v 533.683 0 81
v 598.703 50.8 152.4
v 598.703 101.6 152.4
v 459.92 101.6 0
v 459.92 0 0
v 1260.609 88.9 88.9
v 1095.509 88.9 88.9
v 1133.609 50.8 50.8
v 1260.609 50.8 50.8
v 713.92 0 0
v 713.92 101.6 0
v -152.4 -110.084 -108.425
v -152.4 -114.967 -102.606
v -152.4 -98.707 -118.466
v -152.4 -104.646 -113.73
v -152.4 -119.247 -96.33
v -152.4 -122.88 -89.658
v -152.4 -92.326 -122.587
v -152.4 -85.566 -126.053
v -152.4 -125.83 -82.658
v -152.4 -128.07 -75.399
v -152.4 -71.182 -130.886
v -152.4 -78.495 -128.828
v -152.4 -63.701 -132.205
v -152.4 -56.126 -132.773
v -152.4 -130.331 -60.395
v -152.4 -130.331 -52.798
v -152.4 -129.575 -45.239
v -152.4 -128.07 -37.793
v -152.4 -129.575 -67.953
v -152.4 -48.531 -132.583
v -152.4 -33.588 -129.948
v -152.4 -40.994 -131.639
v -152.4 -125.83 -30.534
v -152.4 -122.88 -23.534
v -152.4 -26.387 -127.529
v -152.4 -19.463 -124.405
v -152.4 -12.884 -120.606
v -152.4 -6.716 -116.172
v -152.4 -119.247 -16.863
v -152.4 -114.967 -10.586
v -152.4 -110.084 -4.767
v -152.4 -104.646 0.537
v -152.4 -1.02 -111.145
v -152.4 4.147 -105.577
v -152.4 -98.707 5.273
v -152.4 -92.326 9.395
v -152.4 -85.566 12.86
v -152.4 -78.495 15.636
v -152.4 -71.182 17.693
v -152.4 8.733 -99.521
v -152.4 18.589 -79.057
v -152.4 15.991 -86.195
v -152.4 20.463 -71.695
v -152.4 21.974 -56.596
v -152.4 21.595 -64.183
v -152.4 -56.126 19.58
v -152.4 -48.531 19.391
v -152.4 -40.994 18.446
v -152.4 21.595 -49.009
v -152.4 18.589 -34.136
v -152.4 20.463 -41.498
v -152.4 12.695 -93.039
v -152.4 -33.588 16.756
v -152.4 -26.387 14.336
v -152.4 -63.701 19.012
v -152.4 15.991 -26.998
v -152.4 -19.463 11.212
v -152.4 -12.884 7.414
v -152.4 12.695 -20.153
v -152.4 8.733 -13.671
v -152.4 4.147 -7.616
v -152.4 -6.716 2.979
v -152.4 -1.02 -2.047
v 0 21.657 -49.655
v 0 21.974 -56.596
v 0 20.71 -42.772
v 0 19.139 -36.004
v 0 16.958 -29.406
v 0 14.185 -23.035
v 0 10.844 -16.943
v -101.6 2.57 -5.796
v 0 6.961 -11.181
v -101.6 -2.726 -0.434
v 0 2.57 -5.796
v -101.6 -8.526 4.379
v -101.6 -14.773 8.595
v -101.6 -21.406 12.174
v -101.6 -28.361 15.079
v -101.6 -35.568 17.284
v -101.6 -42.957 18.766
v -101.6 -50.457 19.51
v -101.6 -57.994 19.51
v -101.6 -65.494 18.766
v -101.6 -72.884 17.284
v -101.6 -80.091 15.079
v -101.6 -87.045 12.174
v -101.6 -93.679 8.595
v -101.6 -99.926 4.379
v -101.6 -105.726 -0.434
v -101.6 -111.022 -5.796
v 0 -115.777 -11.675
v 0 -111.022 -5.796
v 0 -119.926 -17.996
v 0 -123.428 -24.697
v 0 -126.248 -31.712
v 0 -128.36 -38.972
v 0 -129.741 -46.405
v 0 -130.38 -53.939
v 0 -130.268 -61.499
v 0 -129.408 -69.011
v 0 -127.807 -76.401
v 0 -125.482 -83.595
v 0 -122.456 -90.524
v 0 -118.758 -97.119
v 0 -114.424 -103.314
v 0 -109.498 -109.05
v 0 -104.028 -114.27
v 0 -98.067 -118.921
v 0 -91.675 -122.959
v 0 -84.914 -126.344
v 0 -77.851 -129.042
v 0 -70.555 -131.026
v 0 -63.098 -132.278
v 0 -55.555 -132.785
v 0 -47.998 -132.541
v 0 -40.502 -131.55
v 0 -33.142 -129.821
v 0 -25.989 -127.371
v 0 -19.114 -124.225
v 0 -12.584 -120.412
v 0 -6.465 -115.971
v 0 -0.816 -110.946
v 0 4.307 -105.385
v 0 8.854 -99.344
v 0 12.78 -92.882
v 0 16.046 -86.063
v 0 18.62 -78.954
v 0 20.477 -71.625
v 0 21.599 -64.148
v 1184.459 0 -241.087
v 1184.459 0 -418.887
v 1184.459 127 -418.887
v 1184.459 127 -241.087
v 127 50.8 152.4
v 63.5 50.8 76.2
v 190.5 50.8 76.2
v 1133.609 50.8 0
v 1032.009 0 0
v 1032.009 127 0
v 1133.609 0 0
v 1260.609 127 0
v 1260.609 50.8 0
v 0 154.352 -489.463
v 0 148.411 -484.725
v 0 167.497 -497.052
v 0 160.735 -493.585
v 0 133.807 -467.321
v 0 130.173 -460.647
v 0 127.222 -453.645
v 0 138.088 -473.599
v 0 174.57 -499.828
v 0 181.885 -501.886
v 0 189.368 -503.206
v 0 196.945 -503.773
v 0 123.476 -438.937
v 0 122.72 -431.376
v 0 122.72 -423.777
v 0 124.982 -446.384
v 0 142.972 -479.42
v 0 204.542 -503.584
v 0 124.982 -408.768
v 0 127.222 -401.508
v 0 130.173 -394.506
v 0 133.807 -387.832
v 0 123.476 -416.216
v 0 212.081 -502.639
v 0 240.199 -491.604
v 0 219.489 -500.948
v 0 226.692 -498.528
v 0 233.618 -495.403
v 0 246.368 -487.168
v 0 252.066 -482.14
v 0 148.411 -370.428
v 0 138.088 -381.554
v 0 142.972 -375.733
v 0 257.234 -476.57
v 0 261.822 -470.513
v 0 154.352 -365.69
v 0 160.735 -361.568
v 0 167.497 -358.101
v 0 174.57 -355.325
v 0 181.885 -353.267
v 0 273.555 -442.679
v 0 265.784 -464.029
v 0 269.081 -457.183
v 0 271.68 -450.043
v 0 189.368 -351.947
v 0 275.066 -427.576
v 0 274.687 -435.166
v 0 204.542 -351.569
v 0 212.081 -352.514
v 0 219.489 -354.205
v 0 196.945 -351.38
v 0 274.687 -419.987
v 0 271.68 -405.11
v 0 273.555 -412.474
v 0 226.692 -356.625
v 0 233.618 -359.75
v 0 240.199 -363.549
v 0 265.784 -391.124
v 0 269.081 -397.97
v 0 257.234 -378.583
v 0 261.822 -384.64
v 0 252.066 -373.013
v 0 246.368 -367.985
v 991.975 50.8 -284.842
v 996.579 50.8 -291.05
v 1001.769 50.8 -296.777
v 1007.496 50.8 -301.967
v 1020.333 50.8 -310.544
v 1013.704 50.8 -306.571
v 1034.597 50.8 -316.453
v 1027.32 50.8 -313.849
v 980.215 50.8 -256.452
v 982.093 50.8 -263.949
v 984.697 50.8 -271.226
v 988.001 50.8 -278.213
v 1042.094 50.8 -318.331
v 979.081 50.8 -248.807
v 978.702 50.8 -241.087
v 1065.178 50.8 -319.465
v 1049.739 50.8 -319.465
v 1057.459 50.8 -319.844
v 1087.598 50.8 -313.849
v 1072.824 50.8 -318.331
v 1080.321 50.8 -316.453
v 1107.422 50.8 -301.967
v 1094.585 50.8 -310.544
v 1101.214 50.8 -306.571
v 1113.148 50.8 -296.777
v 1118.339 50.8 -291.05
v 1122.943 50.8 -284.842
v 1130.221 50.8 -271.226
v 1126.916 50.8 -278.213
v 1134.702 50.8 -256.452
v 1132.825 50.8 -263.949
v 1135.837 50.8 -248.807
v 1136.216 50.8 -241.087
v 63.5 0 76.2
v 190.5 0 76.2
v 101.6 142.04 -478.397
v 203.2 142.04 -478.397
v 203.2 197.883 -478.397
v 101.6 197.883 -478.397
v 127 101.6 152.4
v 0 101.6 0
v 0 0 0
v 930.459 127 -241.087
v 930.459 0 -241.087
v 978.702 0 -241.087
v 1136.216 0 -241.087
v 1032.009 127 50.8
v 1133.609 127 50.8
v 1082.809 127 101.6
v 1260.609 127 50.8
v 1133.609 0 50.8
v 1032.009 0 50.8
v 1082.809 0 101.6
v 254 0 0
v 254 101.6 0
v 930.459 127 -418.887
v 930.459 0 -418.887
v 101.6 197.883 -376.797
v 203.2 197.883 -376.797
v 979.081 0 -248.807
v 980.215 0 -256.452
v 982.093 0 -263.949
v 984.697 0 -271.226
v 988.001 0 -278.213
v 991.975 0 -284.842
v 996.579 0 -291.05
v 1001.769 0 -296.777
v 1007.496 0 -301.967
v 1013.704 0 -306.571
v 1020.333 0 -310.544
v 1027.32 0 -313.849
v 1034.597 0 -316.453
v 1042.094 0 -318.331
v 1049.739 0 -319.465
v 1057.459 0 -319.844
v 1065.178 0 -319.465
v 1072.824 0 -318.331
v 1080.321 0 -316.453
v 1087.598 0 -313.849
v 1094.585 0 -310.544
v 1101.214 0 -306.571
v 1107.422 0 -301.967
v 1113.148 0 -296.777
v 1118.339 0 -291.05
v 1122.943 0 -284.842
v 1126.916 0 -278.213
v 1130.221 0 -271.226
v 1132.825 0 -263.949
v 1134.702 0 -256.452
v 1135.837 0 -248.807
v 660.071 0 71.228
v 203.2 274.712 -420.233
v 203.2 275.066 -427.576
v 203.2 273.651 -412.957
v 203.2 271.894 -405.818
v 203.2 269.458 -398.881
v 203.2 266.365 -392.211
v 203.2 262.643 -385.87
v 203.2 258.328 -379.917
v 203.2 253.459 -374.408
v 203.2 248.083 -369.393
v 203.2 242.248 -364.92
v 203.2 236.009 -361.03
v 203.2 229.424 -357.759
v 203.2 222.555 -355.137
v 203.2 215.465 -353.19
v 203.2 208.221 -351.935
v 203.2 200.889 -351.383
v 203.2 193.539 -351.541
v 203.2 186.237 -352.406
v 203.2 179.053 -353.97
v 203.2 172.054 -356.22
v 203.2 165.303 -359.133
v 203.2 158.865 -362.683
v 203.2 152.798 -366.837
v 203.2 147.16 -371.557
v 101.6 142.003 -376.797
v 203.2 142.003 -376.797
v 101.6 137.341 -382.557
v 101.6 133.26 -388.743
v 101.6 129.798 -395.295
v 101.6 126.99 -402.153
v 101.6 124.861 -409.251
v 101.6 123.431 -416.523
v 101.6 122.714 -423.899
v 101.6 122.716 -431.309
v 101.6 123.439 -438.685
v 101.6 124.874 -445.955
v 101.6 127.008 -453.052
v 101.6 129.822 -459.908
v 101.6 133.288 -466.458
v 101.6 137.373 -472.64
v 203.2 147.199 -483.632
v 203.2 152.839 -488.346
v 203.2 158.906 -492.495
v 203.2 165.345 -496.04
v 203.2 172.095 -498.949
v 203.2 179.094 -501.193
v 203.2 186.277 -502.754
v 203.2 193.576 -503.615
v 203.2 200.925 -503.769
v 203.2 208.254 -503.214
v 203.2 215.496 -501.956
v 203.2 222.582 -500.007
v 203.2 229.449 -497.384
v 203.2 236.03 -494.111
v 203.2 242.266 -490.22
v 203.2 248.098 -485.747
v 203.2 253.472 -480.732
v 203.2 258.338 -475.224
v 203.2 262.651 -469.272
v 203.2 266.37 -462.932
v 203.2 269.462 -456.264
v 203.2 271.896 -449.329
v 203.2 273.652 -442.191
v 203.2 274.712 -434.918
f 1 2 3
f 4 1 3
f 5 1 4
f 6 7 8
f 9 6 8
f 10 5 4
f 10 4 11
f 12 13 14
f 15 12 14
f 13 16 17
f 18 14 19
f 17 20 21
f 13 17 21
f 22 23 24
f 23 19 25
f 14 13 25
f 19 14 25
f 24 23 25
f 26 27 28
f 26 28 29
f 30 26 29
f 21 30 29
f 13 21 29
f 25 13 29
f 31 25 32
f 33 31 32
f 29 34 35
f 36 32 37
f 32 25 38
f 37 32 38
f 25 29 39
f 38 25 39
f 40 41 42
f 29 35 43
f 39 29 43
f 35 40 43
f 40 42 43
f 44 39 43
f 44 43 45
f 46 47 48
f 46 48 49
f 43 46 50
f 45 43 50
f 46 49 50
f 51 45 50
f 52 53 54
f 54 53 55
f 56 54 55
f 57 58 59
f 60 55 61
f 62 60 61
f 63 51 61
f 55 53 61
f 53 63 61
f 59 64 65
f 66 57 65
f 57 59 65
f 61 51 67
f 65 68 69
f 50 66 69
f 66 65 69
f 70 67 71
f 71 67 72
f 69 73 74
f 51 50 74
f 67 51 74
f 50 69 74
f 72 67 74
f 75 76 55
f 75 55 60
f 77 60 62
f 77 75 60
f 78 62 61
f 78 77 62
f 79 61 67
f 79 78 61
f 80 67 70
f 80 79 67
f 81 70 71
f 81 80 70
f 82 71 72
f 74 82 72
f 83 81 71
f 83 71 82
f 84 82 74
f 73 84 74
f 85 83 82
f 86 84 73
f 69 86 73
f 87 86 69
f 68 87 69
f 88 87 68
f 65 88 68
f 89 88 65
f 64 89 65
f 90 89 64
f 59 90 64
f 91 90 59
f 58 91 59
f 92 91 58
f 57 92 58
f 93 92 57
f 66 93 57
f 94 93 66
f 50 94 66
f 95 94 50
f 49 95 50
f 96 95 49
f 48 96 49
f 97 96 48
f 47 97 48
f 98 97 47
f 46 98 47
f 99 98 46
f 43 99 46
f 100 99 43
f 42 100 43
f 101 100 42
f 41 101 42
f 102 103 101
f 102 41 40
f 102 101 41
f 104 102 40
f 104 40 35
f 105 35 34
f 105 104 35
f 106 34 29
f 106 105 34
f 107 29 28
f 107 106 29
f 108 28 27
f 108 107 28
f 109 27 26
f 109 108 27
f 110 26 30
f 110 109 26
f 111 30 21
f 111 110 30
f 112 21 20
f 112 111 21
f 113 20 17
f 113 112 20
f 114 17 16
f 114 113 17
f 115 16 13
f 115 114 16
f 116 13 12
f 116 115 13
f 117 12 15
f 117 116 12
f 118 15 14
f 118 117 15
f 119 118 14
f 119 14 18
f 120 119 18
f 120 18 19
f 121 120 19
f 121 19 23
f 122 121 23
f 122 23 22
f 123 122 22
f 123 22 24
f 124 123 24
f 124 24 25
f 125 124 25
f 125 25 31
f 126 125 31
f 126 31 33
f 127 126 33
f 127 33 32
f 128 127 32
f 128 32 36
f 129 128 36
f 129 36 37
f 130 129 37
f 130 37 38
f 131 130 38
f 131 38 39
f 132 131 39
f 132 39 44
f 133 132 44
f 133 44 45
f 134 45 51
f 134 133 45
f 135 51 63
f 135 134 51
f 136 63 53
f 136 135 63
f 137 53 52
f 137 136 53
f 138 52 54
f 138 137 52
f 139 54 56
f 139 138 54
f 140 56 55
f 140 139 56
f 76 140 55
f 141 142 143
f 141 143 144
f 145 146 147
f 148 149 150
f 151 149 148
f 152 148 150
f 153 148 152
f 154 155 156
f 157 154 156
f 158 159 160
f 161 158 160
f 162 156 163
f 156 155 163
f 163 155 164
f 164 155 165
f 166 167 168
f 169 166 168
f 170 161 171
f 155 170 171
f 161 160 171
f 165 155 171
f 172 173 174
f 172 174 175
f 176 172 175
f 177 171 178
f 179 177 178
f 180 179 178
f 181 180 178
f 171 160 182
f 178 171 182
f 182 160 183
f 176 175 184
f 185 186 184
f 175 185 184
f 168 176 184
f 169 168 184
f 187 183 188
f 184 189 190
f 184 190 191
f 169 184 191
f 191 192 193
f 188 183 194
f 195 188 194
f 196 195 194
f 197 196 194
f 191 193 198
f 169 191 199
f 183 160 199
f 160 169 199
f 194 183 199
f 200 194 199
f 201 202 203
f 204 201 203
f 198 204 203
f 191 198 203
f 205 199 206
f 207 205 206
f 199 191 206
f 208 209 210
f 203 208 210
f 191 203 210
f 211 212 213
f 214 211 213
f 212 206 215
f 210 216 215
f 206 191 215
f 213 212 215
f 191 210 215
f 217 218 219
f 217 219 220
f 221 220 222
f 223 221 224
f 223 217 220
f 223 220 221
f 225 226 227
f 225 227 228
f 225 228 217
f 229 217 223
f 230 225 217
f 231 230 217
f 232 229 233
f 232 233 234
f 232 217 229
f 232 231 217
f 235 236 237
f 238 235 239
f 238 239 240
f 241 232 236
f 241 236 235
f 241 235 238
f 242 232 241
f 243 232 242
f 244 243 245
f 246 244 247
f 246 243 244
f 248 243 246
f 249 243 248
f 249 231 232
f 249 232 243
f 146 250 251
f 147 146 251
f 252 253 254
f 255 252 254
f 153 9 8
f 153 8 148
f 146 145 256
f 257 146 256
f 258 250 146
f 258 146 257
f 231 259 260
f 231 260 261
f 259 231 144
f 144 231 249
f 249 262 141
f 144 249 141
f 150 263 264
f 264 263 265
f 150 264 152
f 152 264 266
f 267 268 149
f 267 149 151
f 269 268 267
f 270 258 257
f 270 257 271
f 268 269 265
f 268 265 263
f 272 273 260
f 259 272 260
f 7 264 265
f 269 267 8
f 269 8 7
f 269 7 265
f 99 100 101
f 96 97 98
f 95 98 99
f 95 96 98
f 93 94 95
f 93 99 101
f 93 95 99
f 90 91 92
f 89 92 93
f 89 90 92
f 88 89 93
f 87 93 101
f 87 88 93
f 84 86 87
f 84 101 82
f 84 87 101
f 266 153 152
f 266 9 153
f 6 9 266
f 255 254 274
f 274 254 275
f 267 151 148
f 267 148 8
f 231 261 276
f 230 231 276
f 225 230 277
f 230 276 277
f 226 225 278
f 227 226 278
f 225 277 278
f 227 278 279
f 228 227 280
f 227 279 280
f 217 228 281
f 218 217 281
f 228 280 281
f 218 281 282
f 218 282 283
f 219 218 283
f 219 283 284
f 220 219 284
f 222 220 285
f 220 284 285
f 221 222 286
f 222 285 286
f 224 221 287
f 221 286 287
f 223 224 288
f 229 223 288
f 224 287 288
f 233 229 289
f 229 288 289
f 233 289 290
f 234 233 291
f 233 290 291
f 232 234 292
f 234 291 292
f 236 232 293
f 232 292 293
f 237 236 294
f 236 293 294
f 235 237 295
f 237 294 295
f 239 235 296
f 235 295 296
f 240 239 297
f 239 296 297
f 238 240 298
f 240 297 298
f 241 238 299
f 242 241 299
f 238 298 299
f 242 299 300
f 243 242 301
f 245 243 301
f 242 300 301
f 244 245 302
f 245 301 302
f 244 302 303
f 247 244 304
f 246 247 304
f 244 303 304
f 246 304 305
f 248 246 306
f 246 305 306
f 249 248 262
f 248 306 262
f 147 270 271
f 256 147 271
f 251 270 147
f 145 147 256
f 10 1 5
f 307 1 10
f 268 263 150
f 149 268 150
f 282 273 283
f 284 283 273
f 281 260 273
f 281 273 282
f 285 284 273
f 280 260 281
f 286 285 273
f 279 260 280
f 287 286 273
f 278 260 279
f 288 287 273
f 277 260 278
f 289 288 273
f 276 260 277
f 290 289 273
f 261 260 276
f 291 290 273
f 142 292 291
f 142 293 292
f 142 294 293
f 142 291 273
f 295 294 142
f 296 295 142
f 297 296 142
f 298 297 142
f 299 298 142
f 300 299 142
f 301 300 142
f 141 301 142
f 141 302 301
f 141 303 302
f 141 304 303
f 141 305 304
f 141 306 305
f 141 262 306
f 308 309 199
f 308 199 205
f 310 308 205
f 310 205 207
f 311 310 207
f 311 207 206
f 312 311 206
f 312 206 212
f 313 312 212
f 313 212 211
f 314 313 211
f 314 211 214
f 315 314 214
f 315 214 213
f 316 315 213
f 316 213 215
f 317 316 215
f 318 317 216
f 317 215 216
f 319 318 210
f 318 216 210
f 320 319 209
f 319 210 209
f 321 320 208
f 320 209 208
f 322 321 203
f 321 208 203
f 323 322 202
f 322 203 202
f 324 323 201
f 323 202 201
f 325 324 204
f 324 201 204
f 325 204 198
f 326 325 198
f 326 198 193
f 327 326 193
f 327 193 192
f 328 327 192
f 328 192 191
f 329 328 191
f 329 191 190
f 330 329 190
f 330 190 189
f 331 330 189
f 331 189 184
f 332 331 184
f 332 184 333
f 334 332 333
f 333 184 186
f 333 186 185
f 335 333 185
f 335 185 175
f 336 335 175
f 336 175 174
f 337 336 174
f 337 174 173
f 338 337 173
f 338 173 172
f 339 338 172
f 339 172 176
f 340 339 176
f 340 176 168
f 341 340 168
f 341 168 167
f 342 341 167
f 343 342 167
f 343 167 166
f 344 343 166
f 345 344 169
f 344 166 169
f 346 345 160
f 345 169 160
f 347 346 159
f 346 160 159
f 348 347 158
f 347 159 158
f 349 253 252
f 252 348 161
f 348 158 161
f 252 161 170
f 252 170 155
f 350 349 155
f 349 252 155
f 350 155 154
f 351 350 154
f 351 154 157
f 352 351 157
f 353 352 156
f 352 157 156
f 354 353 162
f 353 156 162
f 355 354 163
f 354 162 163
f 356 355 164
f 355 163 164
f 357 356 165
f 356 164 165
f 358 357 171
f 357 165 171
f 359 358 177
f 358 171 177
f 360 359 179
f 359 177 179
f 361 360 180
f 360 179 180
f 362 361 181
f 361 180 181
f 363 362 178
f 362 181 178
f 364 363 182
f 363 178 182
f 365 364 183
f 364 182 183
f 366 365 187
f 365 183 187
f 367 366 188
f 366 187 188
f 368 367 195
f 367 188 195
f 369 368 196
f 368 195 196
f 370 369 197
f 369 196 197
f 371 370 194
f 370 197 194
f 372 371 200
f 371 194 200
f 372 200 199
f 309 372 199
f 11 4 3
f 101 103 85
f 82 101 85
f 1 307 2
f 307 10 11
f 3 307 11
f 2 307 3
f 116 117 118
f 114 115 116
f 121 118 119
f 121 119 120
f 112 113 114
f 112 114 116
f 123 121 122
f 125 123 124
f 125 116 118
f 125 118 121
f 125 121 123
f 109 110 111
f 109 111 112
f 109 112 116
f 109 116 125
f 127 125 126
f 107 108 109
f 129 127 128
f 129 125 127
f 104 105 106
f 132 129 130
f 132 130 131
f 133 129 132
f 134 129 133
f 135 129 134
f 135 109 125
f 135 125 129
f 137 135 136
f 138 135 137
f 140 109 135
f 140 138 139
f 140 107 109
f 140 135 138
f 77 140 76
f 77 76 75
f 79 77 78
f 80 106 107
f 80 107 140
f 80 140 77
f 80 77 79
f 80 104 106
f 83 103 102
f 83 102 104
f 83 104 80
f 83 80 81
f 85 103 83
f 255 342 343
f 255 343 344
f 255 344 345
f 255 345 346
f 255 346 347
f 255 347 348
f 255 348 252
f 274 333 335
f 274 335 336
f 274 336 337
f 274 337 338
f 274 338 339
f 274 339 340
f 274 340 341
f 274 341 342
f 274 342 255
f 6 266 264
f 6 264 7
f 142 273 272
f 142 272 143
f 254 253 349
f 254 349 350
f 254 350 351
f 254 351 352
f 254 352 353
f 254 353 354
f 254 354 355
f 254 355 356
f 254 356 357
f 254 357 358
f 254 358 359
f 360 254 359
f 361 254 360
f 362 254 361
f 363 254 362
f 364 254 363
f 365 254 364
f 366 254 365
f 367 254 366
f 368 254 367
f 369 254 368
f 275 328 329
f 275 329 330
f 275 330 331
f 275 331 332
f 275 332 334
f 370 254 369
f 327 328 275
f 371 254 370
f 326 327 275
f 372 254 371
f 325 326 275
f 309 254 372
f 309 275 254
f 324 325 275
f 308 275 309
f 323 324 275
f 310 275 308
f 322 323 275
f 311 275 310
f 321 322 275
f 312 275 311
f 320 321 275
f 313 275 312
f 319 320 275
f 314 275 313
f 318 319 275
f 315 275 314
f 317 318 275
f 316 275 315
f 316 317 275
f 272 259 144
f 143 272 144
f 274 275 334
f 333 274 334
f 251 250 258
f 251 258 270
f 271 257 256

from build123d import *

# Parameters (mm, degrees)
F1_DEPTH  = 101.6
F3_DEPTH  = 50.8
F5_DEPTH  = 101.6
F9_DEPTH  = 76.2
F11_DEPTH = 127
F15_R     = 76.2
F16_DEPTH = 152.4
F18_DEPTH = 101.6
F19_R     = 76.2205995961
F20_DEPTH = 203.2
F22_DEPTH = 101.6
F23_W     = 254
F23_H     = 177.8
F24_DEPTH = 127
F26_DEPTH = 50.8


with BuildPart() as f1:
    # F0 (on Front) → F1 (new body)
    with BuildSketch(Plane.XZ):
        Polygon((127, 152.4), (0, 0), (254, 0), align=None)
    extrude(amount=-F1_DEPTH)

    # F2 (on face) → F3 (cut)
    with BuildSketch(Plane.XZ):
        Polygon((127, 152.4), (63.5, 76.2), (190.5, 76.2), align=None)
    extrude(amount=-F3_DEPTH, mode=Mode.SUBTRACT)


with BuildPart() as f5:
    # F4 (on Front) → F5 (new body)
    with BuildSketch(Plane.XZ):
        Polygon((598.7033731911, 152.4), (459.9198227574, 0), (713.9198227574, 0), align=None)
    extrude(amount=-F5_DEPTH)

    # F8 (on 3pt) → F9 (cut, symmetric)
    with BuildSketch(Plane(origin=(583.4318544266, 0, -45.1108837356), x_dir=(0, 1, 0), z_dir=(0.9970241541, 0, -0.0770897927))):
        Polygon((50.8, 198.100399998), (0, 198.100399998), (0, 121.900399998), align=None)
    extrude(amount=F9_DEPTH, both=True, mode=Mode.SUBTRACT)


with BuildPart() as f11:
    # F10 (on Front) → F11 (new body)
    with BuildSketch(Plane.XZ):
        Polygon((1032.0093378178, 50.8), (1032.0093378178, 0), (1133.6093378178, 0), (1133.6093378178, 50.8), (1082.8093697124, 101.6), align=None)
    extrude(amount=-F11_DEPTH)

    # F13 (on offset) → F14 (join, up to the next surface of F11)
    with BuildSketch(Plane.YZ.offset(1260.6093378178)):
        Polygon((50.8, 0), (127, 0), (127, 50.8), (88.9, 88.9), (50.8, 50.8), align=None)
    extrude(until=Until.NEXT, dir=(-1, 0, 0))


with BuildPart() as f16:
    # F15 (on Right) → F16 (new body)
    with BuildSketch(Plane.YZ):
        with Locations((-54.2258955538, -56.5963201225)):
            Circle(F15_R)
    extrude(amount=-F16_DEPTH)

    # F17 (on face) → F18 (cut)
    with BuildSketch(Plane.YZ):
        with BuildLine():
            ThreePointArc((2.5702310747, -5.7963201225), (-54.2258955538, 19.6036798775), (-111.0220221823, -5.7963201225))
            Line((-111.0220221823, -5.7963201225), (2.5702310747, -5.7963201225))
        make_face()
    extrude(amount=-F18_DEPTH, mode=Mode.SUBTRACT)


with BuildPart() as f20:
    # F19 (on Right) → F20 (new body)
    with BuildSketch(Plane.YZ):
        with Locations((198.8455802202, -427.576482296)):
            Circle(F19_R)
    extrude(amount=F20_DEPTH)

    # F21 (on face) → F22 (cut)
    with BuildSketch(Plane.YZ.offset(203.2)):
        with BuildLine():
            Line((197.8834101577, -376.7970818921), (142.0034101577, -376.7970818921))
            ThreePointArc((142.0034101577, -376.7970818921), (122.6249856325, -427.6041135831), (142.0402419193, -478.3970818921))
            Line((142.0402419193, -478.3970818921), (197.8834101577, -478.3970818921))
            Line((197.8834101577, -478.3970818921), (197.8834101577, -376.7970818921))
        make_face()
    extrude(amount=-F22_DEPTH, mode=Mode.SUBTRACT)


with BuildPart() as f24:
    # F23 (on Front) → F24 (new body)
    with BuildSketch(Plane.XZ):
        with Locations((1057.4588435119, -329.9870565534)):
            Rectangle(F23_W, F23_H)
    extrude(amount=-F24_DEPTH)

    # F25 (on face) → F26 (cut)
    with BuildSketch(Plane.XZ):
        with BuildLine():
            ThreePointArc((978.7019110825, -241.0870565534), (1057.4588435119, -319.8439889828), (1136.2157759414, -241.0870565534))
            Line((1136.2157759414, -241.0870565534), (978.7019110825, -241.0870565534))
        make_face()
    extrude(amount=-F26_DEPTH, mode=Mode.SUBTRACT)


solid = Compound([f1.part, f5.part, f11.part, f16.part, f20.part, f24.part])
